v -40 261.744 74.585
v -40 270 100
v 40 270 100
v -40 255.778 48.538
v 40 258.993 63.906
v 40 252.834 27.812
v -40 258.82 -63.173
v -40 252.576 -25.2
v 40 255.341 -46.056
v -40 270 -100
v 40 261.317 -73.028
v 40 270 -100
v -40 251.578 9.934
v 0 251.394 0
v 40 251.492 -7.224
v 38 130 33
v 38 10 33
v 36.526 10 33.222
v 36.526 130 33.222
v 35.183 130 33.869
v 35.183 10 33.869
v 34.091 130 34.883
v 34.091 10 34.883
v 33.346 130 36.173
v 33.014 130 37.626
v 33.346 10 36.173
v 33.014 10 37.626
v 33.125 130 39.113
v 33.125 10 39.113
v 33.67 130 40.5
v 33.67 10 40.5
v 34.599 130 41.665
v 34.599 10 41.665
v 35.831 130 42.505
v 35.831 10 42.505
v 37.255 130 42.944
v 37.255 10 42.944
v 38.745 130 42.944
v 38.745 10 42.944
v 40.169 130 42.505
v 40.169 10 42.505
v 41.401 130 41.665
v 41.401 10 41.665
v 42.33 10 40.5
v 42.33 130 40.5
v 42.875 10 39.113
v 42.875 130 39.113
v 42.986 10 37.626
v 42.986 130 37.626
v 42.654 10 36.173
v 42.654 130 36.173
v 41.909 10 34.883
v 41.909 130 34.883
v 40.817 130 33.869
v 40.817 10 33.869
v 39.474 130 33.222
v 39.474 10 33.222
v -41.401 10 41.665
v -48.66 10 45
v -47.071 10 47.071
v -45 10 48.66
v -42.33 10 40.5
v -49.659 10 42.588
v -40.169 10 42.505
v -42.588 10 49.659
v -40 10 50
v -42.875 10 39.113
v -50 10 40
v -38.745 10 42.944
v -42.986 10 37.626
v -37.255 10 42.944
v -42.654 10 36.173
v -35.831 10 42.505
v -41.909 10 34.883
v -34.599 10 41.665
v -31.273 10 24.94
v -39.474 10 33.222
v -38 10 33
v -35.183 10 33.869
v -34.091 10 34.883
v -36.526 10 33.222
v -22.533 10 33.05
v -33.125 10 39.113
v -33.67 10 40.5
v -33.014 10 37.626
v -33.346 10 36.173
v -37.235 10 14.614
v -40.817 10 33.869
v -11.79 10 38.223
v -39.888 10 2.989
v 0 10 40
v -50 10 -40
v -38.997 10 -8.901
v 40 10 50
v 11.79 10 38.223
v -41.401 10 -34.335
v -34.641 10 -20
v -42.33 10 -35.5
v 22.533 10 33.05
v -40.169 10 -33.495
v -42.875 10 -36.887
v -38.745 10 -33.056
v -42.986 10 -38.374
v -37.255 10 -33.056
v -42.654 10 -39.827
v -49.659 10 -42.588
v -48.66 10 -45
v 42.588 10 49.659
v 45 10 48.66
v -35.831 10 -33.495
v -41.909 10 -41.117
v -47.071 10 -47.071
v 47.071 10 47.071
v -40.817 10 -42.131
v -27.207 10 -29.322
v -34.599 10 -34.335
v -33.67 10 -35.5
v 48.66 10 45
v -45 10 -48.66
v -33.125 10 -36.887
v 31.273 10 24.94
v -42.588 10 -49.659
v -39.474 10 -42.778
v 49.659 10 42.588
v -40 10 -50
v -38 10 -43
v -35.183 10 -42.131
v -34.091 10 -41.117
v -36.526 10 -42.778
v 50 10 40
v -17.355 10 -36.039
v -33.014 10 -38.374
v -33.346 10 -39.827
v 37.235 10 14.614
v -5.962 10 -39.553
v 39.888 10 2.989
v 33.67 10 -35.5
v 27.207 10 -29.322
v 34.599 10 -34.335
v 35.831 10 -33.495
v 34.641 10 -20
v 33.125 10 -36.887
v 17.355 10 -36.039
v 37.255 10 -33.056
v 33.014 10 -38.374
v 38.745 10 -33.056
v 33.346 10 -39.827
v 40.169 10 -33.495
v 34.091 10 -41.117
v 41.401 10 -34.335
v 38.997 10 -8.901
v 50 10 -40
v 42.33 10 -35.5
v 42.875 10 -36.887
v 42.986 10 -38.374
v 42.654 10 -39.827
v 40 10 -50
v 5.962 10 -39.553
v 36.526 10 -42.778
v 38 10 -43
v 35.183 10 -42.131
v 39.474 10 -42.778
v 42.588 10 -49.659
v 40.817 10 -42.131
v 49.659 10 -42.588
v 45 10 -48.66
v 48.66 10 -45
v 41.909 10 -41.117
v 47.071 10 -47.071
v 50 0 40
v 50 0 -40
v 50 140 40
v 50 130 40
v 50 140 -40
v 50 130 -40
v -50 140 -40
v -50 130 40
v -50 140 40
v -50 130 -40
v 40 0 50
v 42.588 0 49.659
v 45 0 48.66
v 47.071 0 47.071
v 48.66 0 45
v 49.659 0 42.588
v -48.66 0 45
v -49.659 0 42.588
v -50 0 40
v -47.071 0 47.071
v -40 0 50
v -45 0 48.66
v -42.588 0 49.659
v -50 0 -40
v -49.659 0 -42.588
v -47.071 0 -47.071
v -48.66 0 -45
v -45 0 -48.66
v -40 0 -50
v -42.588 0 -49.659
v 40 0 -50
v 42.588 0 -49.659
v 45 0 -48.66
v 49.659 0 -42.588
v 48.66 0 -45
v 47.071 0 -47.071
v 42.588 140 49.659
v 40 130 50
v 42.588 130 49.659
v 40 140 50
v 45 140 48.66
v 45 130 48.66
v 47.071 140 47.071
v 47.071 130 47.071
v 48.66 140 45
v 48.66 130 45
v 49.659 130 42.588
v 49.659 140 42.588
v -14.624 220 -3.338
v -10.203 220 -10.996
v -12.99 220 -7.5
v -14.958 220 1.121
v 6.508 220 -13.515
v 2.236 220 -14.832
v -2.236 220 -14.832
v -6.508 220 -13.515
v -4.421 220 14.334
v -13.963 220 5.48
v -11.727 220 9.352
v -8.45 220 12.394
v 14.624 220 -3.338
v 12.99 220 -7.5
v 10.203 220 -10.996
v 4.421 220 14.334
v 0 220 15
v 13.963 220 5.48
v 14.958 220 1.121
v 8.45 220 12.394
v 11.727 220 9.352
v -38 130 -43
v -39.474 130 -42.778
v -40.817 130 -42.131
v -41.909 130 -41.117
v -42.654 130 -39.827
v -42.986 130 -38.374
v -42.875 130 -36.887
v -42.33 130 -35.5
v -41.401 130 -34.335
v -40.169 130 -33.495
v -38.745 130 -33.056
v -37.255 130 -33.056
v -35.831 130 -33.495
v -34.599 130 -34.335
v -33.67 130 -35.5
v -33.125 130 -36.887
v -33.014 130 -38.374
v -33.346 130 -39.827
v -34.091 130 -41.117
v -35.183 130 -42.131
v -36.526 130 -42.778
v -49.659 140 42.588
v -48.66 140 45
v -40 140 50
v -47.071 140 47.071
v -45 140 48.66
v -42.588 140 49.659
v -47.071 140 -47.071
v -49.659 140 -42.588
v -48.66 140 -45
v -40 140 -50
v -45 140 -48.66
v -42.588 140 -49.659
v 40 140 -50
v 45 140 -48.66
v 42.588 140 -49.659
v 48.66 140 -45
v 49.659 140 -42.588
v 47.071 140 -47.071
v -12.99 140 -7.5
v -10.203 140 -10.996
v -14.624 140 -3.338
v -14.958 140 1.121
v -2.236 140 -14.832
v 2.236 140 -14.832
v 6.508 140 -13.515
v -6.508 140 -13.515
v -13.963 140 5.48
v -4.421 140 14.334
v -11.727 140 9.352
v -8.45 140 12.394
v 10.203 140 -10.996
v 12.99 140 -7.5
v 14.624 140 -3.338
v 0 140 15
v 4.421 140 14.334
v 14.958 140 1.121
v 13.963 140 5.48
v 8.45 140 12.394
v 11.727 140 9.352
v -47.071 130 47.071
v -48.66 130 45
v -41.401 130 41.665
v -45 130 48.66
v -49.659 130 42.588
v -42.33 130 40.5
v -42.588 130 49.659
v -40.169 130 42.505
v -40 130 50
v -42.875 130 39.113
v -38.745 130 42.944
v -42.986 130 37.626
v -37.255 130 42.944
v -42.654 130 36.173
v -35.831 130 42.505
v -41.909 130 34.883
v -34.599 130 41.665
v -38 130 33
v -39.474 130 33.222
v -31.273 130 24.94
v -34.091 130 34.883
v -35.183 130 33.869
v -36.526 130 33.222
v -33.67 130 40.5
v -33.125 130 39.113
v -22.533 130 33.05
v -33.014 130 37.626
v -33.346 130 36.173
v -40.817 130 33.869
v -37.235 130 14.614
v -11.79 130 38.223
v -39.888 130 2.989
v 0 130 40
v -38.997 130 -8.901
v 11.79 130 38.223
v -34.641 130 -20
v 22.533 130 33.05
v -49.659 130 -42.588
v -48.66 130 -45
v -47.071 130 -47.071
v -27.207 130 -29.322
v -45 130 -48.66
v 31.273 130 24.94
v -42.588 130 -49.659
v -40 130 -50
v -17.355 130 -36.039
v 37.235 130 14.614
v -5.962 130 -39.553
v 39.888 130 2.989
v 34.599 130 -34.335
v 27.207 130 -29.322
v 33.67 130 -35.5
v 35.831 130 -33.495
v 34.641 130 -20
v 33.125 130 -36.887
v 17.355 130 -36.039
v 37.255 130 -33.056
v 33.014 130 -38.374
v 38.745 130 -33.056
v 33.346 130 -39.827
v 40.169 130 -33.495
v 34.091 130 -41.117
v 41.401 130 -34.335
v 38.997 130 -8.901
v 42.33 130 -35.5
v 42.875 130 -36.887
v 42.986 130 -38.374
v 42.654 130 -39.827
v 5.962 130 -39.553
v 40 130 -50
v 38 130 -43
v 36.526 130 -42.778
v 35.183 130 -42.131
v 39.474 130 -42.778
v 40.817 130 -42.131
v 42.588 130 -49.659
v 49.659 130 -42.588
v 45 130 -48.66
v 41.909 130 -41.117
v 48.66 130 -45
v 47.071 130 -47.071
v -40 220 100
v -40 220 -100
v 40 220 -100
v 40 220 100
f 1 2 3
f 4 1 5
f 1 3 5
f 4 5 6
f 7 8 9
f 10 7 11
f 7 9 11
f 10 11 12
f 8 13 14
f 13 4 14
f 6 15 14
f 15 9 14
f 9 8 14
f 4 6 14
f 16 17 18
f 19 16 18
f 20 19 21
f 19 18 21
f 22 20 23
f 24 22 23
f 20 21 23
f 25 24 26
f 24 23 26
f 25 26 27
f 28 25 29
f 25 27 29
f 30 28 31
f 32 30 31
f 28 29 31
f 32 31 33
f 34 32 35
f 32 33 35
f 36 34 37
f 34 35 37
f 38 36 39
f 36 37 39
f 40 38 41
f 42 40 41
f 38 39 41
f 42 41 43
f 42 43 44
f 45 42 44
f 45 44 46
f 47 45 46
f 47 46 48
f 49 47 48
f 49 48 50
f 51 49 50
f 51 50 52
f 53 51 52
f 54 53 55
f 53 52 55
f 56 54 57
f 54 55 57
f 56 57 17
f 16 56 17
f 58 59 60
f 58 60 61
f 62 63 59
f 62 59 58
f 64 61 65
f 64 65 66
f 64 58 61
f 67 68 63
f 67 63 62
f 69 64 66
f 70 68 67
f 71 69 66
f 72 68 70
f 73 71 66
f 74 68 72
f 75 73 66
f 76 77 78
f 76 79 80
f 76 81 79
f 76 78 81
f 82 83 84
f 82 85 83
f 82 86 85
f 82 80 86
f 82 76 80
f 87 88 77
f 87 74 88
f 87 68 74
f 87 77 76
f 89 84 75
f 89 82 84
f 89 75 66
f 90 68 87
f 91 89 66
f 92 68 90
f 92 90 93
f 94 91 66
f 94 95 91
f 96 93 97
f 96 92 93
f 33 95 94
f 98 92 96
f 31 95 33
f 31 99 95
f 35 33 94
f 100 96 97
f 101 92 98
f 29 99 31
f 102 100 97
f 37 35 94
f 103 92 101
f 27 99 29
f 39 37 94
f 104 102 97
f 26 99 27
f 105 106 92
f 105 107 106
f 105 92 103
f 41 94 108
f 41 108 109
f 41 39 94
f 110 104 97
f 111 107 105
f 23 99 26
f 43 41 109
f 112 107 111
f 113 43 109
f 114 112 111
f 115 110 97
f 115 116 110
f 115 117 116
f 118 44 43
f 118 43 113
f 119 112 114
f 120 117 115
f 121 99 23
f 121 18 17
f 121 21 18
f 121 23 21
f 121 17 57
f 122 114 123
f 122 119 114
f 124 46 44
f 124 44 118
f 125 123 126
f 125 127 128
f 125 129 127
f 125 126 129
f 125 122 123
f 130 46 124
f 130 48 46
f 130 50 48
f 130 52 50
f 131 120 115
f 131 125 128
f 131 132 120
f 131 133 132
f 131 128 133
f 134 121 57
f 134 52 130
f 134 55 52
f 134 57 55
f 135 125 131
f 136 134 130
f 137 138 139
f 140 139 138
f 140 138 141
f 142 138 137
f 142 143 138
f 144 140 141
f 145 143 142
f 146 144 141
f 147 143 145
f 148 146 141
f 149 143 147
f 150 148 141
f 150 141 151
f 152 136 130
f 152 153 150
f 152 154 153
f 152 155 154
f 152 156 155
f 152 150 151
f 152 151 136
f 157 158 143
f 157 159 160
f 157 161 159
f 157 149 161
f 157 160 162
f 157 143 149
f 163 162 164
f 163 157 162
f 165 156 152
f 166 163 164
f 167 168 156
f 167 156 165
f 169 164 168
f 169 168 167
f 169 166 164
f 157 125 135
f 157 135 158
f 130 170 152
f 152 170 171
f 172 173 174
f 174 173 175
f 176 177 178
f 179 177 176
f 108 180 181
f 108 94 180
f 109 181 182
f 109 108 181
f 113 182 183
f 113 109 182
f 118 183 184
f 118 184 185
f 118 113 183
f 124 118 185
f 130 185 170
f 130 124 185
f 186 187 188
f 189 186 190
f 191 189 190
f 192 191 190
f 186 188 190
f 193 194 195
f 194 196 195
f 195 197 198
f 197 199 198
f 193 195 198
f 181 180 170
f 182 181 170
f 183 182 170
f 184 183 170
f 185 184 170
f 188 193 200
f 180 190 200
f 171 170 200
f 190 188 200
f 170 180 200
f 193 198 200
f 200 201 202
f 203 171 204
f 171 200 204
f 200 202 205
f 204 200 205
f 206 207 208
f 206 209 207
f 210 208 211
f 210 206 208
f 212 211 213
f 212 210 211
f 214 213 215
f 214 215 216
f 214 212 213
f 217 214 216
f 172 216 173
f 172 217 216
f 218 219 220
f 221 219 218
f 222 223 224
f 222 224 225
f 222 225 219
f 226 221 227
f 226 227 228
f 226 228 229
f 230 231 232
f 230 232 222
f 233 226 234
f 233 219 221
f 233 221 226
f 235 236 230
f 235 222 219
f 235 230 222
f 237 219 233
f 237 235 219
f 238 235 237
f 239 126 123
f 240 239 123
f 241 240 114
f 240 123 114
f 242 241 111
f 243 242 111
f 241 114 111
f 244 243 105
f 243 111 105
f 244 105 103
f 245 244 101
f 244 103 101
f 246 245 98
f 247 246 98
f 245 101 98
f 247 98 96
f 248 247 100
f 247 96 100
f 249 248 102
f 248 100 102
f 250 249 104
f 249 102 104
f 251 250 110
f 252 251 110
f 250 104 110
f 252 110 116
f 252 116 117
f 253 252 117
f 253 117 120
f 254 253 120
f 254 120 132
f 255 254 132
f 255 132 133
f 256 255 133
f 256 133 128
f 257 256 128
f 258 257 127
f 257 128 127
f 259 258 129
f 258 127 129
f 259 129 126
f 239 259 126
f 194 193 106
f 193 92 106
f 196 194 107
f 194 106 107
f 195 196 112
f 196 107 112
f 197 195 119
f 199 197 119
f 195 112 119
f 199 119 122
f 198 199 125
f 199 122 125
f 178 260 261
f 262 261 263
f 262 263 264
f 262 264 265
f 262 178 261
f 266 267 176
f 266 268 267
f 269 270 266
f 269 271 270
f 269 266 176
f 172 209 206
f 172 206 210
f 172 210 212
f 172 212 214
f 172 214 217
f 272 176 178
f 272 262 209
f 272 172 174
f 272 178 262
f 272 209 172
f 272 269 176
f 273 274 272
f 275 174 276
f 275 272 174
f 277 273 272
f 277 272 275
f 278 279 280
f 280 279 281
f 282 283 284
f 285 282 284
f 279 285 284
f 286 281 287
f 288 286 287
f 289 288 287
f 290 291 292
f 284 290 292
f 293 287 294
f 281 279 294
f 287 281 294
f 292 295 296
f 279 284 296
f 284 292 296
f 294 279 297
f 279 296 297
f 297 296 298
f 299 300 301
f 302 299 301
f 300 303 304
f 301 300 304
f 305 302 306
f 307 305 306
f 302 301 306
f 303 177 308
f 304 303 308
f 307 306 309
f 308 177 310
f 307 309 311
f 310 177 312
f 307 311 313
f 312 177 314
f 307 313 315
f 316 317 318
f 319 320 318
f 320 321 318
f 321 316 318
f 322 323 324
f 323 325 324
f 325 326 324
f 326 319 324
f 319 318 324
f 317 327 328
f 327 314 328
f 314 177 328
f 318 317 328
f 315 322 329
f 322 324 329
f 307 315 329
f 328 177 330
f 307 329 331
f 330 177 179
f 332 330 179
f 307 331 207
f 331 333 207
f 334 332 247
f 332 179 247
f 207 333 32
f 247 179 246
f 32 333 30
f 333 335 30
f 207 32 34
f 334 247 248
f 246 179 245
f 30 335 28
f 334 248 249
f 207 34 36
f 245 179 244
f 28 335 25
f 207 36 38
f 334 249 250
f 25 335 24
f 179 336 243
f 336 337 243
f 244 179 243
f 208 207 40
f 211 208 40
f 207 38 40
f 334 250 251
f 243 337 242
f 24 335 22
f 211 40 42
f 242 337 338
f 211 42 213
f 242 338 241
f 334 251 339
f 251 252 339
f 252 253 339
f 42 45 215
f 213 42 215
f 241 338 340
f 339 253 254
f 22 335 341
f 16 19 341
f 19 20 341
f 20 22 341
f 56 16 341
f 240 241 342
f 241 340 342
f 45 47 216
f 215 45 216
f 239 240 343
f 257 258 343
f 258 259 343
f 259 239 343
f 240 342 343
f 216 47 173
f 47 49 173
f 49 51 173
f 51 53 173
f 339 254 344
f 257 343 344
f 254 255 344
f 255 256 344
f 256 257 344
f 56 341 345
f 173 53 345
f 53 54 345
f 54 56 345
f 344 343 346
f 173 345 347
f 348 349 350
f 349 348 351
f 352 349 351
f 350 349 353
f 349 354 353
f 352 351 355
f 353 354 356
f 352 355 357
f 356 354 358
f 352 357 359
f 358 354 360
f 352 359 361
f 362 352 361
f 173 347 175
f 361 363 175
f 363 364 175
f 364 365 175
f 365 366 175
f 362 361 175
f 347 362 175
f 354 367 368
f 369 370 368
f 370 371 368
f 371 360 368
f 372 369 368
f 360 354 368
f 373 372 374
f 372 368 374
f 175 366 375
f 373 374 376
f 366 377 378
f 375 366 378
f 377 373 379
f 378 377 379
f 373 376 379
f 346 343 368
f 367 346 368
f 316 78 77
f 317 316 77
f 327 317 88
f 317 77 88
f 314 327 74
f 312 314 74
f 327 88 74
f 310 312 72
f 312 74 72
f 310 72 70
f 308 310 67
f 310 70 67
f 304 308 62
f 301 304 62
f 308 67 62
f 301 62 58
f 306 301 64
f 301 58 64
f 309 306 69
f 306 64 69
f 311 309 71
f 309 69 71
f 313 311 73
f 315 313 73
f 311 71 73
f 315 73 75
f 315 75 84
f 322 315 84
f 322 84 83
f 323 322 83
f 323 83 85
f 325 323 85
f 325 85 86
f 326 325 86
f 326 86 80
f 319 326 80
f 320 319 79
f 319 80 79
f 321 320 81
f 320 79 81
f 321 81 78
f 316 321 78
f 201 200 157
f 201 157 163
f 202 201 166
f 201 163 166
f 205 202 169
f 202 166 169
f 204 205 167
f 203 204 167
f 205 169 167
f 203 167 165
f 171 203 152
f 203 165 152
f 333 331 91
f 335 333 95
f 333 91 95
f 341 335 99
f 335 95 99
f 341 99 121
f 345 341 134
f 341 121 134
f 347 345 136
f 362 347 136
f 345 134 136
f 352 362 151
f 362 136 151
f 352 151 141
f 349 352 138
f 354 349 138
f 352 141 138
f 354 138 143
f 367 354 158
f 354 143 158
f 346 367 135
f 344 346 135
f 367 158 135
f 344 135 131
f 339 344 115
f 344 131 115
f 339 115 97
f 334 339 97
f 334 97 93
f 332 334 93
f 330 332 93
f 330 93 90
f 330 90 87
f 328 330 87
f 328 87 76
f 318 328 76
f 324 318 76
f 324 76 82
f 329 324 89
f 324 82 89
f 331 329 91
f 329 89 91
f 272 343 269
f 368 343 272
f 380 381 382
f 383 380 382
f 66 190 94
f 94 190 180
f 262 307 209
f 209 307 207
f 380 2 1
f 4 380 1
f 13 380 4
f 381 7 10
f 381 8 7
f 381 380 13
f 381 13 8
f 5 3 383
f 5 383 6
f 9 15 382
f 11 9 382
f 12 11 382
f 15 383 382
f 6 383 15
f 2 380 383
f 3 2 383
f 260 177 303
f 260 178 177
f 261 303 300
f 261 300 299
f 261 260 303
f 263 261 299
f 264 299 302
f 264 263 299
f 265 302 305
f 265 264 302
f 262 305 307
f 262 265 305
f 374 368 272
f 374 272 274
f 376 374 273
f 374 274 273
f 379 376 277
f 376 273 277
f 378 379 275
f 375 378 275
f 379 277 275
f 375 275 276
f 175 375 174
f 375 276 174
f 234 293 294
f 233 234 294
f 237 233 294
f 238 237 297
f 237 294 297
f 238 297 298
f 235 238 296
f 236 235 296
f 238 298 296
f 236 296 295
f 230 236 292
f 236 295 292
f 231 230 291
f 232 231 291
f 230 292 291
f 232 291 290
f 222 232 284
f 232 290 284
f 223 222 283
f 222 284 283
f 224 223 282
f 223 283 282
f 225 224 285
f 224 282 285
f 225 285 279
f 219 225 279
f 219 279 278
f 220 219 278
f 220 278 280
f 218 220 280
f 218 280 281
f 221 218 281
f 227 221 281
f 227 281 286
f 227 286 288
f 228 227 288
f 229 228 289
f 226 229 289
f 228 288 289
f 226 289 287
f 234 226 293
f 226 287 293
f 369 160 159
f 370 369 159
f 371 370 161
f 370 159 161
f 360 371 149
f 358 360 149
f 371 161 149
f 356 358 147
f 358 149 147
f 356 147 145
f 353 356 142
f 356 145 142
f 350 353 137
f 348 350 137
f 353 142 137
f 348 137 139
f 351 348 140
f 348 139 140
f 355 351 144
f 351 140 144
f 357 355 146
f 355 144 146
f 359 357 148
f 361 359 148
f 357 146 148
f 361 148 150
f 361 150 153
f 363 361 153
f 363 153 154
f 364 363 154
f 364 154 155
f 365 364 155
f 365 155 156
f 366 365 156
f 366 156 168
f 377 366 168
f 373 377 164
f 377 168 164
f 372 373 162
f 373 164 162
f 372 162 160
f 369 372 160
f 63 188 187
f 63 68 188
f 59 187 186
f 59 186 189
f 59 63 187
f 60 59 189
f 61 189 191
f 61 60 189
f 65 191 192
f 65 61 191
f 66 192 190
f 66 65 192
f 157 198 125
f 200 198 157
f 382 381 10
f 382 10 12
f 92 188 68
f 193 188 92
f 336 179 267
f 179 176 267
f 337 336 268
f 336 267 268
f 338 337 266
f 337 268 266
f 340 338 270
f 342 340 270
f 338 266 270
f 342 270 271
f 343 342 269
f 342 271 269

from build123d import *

# Parameters (mm, degrees)
SKETCH1_W           = 100
SKETCH1_H           = 100
BOSS_EXTRUDE1_DEPTH = 10
SKETCH2_R           = 40
BOSS_EXTRUDE2_DEPTH = 120
SKETCH3_W           = 100
SKETCH3_H           = 100
BOSS_EXTRUDE3_DEPTH = 10
SKETCH4_R           = 15
BOSS_EXTRUDE4_DEPTH = 80
SKETCH5_R           = 5
BOSS_EXTRUDE5_DEPTH = 120
FILLET1_R           = 10
SKETCH6_W           = 80
SKETCH6_H           = 200
BOSS_EXTRUDE6_DEPTH = 50
CUT_EXTRUDE3_DEPTH  = 1500


with BuildPart() as part:
    # Sketch1 → Boss-Extrude1 (new body)
    with BuildSketch(Plane(origin=(0, 0, 0), x_dir=(1, 0, 0), z_dir=(0, 1, 0))):
        Rectangle(SKETCH1_W, SKETCH1_H)
    extrude(amount=BOSS_EXTRUDE1_DEPTH)



with BuildPart() as body_2:
    # Sketch2 → Boss-Extrude2 (new body)
    with BuildSketch(Plane(origin=(0, 10, 0), x_dir=(1, 0, 0), z_dir=(0, 1, 0))):
        with Locations(Location((0, 0, 0), (0, 0, 270))):
            Circle(SKETCH2_R)
    extrude(amount=BOSS_EXTRUDE2_DEPTH)


with BuildPart() as body_3:
    # Sketch3 → Boss-Extrude3 (new body)
    with BuildSketch(Plane(origin=(0, 130, 0), x_dir=(1, 0, 0), z_dir=(0, 1, 0))):
        Rectangle(SKETCH3_W, SKETCH3_H)
    extrude(amount=BOSS_EXTRUDE3_DEPTH)


with BuildPart() as body_4:
    # Sketch4 → Boss-Extrude4 (new body)
    with BuildSketch(Plane(origin=(0, 140, 0), x_dir=(1, 0, 0), z_dir=(0, 1, 0))):
        with Locations(Location((0, 0, 0), (0, 0, 270))):
            Circle(SKETCH4_R)
    extrude(amount=BOSS_EXTRUDE4_DEPTH)


with BuildPart() as part_1:
    add(part.part)

    add(body_2.part)  # Boss-Extrude5 merges body 2

    add(body_3.part)  # Boss-Extrude5 merges body 3
    # Sketch5 → Boss-Extrude5 (add)
    with BuildSketch(Plane(origin=(0, 10, 0), x_dir=(1, 0, 0), z_dir=(0, 1, 0))):
        with Locations(Location((-38, 38, 0), (0, 0, 90))):
            Circle(SKETCH5_R)
        with Locations(Location((38, 38, 0), (0, 0, 90))):
            Circle(SKETCH5_R)
        with Locations(Location((38, -38, 0), (0, 0, 90))):
            Circle(SKETCH5_R)
        with Locations(Location((-38, -38, 0), (0, 0, 90))):
            Circle(SKETCH5_R)
    extrude(amount=BOSS_EXTRUDE5_DEPTH)

    # Fillet1
    fillet1_edges = [part_1.edges().sort_by_distance(p)[0] for p in [
        (-50, 135, -50),
        (-50, 135, 50),
        (50, 135, 50),
        (50, 135, -50),
        (50, 5, 50),
        (-50, 5, 50),
        (-50, 5, -50),
        (50, 5, -50),
    ]]
    fillet(fillet1_edges, radius=FILLET1_R)


with BuildPart() as body_3_2:
    # Sketch6 → Boss-Extrude6 (new body)
    with BuildSketch(Plane(origin=(0, 220, 0), x_dir=(1, 0, 0), z_dir=(0, 1, 0))):
        Rectangle(SKETCH6_W, SKETCH6_H)
    extrude(amount=BOSS_EXTRUDE6_DEPTH)

    # Sketch7 → Cut-Extrude3 (cut)
    with BuildSketch(Plane(origin=(40, 0, 0), x_dir=(0, 0, -1), z_dir=(1, 0, 0))):
        with BuildLine():
            Line((-100, 270), (100, 270))
            add(Edge.make_bspline(
                [(-100, 270), (0, 232.788897751), (100, 270)],
                knots=[0, 0, 0, 1, 1, 1], degree=2))
        make_face()
    extrude(amount=-CUT_EXTRUDE3_DEPTH, mode=Mode.SUBTRACT)


solid = Compound([body_4.part, part_1.part, body_3_2.part])
